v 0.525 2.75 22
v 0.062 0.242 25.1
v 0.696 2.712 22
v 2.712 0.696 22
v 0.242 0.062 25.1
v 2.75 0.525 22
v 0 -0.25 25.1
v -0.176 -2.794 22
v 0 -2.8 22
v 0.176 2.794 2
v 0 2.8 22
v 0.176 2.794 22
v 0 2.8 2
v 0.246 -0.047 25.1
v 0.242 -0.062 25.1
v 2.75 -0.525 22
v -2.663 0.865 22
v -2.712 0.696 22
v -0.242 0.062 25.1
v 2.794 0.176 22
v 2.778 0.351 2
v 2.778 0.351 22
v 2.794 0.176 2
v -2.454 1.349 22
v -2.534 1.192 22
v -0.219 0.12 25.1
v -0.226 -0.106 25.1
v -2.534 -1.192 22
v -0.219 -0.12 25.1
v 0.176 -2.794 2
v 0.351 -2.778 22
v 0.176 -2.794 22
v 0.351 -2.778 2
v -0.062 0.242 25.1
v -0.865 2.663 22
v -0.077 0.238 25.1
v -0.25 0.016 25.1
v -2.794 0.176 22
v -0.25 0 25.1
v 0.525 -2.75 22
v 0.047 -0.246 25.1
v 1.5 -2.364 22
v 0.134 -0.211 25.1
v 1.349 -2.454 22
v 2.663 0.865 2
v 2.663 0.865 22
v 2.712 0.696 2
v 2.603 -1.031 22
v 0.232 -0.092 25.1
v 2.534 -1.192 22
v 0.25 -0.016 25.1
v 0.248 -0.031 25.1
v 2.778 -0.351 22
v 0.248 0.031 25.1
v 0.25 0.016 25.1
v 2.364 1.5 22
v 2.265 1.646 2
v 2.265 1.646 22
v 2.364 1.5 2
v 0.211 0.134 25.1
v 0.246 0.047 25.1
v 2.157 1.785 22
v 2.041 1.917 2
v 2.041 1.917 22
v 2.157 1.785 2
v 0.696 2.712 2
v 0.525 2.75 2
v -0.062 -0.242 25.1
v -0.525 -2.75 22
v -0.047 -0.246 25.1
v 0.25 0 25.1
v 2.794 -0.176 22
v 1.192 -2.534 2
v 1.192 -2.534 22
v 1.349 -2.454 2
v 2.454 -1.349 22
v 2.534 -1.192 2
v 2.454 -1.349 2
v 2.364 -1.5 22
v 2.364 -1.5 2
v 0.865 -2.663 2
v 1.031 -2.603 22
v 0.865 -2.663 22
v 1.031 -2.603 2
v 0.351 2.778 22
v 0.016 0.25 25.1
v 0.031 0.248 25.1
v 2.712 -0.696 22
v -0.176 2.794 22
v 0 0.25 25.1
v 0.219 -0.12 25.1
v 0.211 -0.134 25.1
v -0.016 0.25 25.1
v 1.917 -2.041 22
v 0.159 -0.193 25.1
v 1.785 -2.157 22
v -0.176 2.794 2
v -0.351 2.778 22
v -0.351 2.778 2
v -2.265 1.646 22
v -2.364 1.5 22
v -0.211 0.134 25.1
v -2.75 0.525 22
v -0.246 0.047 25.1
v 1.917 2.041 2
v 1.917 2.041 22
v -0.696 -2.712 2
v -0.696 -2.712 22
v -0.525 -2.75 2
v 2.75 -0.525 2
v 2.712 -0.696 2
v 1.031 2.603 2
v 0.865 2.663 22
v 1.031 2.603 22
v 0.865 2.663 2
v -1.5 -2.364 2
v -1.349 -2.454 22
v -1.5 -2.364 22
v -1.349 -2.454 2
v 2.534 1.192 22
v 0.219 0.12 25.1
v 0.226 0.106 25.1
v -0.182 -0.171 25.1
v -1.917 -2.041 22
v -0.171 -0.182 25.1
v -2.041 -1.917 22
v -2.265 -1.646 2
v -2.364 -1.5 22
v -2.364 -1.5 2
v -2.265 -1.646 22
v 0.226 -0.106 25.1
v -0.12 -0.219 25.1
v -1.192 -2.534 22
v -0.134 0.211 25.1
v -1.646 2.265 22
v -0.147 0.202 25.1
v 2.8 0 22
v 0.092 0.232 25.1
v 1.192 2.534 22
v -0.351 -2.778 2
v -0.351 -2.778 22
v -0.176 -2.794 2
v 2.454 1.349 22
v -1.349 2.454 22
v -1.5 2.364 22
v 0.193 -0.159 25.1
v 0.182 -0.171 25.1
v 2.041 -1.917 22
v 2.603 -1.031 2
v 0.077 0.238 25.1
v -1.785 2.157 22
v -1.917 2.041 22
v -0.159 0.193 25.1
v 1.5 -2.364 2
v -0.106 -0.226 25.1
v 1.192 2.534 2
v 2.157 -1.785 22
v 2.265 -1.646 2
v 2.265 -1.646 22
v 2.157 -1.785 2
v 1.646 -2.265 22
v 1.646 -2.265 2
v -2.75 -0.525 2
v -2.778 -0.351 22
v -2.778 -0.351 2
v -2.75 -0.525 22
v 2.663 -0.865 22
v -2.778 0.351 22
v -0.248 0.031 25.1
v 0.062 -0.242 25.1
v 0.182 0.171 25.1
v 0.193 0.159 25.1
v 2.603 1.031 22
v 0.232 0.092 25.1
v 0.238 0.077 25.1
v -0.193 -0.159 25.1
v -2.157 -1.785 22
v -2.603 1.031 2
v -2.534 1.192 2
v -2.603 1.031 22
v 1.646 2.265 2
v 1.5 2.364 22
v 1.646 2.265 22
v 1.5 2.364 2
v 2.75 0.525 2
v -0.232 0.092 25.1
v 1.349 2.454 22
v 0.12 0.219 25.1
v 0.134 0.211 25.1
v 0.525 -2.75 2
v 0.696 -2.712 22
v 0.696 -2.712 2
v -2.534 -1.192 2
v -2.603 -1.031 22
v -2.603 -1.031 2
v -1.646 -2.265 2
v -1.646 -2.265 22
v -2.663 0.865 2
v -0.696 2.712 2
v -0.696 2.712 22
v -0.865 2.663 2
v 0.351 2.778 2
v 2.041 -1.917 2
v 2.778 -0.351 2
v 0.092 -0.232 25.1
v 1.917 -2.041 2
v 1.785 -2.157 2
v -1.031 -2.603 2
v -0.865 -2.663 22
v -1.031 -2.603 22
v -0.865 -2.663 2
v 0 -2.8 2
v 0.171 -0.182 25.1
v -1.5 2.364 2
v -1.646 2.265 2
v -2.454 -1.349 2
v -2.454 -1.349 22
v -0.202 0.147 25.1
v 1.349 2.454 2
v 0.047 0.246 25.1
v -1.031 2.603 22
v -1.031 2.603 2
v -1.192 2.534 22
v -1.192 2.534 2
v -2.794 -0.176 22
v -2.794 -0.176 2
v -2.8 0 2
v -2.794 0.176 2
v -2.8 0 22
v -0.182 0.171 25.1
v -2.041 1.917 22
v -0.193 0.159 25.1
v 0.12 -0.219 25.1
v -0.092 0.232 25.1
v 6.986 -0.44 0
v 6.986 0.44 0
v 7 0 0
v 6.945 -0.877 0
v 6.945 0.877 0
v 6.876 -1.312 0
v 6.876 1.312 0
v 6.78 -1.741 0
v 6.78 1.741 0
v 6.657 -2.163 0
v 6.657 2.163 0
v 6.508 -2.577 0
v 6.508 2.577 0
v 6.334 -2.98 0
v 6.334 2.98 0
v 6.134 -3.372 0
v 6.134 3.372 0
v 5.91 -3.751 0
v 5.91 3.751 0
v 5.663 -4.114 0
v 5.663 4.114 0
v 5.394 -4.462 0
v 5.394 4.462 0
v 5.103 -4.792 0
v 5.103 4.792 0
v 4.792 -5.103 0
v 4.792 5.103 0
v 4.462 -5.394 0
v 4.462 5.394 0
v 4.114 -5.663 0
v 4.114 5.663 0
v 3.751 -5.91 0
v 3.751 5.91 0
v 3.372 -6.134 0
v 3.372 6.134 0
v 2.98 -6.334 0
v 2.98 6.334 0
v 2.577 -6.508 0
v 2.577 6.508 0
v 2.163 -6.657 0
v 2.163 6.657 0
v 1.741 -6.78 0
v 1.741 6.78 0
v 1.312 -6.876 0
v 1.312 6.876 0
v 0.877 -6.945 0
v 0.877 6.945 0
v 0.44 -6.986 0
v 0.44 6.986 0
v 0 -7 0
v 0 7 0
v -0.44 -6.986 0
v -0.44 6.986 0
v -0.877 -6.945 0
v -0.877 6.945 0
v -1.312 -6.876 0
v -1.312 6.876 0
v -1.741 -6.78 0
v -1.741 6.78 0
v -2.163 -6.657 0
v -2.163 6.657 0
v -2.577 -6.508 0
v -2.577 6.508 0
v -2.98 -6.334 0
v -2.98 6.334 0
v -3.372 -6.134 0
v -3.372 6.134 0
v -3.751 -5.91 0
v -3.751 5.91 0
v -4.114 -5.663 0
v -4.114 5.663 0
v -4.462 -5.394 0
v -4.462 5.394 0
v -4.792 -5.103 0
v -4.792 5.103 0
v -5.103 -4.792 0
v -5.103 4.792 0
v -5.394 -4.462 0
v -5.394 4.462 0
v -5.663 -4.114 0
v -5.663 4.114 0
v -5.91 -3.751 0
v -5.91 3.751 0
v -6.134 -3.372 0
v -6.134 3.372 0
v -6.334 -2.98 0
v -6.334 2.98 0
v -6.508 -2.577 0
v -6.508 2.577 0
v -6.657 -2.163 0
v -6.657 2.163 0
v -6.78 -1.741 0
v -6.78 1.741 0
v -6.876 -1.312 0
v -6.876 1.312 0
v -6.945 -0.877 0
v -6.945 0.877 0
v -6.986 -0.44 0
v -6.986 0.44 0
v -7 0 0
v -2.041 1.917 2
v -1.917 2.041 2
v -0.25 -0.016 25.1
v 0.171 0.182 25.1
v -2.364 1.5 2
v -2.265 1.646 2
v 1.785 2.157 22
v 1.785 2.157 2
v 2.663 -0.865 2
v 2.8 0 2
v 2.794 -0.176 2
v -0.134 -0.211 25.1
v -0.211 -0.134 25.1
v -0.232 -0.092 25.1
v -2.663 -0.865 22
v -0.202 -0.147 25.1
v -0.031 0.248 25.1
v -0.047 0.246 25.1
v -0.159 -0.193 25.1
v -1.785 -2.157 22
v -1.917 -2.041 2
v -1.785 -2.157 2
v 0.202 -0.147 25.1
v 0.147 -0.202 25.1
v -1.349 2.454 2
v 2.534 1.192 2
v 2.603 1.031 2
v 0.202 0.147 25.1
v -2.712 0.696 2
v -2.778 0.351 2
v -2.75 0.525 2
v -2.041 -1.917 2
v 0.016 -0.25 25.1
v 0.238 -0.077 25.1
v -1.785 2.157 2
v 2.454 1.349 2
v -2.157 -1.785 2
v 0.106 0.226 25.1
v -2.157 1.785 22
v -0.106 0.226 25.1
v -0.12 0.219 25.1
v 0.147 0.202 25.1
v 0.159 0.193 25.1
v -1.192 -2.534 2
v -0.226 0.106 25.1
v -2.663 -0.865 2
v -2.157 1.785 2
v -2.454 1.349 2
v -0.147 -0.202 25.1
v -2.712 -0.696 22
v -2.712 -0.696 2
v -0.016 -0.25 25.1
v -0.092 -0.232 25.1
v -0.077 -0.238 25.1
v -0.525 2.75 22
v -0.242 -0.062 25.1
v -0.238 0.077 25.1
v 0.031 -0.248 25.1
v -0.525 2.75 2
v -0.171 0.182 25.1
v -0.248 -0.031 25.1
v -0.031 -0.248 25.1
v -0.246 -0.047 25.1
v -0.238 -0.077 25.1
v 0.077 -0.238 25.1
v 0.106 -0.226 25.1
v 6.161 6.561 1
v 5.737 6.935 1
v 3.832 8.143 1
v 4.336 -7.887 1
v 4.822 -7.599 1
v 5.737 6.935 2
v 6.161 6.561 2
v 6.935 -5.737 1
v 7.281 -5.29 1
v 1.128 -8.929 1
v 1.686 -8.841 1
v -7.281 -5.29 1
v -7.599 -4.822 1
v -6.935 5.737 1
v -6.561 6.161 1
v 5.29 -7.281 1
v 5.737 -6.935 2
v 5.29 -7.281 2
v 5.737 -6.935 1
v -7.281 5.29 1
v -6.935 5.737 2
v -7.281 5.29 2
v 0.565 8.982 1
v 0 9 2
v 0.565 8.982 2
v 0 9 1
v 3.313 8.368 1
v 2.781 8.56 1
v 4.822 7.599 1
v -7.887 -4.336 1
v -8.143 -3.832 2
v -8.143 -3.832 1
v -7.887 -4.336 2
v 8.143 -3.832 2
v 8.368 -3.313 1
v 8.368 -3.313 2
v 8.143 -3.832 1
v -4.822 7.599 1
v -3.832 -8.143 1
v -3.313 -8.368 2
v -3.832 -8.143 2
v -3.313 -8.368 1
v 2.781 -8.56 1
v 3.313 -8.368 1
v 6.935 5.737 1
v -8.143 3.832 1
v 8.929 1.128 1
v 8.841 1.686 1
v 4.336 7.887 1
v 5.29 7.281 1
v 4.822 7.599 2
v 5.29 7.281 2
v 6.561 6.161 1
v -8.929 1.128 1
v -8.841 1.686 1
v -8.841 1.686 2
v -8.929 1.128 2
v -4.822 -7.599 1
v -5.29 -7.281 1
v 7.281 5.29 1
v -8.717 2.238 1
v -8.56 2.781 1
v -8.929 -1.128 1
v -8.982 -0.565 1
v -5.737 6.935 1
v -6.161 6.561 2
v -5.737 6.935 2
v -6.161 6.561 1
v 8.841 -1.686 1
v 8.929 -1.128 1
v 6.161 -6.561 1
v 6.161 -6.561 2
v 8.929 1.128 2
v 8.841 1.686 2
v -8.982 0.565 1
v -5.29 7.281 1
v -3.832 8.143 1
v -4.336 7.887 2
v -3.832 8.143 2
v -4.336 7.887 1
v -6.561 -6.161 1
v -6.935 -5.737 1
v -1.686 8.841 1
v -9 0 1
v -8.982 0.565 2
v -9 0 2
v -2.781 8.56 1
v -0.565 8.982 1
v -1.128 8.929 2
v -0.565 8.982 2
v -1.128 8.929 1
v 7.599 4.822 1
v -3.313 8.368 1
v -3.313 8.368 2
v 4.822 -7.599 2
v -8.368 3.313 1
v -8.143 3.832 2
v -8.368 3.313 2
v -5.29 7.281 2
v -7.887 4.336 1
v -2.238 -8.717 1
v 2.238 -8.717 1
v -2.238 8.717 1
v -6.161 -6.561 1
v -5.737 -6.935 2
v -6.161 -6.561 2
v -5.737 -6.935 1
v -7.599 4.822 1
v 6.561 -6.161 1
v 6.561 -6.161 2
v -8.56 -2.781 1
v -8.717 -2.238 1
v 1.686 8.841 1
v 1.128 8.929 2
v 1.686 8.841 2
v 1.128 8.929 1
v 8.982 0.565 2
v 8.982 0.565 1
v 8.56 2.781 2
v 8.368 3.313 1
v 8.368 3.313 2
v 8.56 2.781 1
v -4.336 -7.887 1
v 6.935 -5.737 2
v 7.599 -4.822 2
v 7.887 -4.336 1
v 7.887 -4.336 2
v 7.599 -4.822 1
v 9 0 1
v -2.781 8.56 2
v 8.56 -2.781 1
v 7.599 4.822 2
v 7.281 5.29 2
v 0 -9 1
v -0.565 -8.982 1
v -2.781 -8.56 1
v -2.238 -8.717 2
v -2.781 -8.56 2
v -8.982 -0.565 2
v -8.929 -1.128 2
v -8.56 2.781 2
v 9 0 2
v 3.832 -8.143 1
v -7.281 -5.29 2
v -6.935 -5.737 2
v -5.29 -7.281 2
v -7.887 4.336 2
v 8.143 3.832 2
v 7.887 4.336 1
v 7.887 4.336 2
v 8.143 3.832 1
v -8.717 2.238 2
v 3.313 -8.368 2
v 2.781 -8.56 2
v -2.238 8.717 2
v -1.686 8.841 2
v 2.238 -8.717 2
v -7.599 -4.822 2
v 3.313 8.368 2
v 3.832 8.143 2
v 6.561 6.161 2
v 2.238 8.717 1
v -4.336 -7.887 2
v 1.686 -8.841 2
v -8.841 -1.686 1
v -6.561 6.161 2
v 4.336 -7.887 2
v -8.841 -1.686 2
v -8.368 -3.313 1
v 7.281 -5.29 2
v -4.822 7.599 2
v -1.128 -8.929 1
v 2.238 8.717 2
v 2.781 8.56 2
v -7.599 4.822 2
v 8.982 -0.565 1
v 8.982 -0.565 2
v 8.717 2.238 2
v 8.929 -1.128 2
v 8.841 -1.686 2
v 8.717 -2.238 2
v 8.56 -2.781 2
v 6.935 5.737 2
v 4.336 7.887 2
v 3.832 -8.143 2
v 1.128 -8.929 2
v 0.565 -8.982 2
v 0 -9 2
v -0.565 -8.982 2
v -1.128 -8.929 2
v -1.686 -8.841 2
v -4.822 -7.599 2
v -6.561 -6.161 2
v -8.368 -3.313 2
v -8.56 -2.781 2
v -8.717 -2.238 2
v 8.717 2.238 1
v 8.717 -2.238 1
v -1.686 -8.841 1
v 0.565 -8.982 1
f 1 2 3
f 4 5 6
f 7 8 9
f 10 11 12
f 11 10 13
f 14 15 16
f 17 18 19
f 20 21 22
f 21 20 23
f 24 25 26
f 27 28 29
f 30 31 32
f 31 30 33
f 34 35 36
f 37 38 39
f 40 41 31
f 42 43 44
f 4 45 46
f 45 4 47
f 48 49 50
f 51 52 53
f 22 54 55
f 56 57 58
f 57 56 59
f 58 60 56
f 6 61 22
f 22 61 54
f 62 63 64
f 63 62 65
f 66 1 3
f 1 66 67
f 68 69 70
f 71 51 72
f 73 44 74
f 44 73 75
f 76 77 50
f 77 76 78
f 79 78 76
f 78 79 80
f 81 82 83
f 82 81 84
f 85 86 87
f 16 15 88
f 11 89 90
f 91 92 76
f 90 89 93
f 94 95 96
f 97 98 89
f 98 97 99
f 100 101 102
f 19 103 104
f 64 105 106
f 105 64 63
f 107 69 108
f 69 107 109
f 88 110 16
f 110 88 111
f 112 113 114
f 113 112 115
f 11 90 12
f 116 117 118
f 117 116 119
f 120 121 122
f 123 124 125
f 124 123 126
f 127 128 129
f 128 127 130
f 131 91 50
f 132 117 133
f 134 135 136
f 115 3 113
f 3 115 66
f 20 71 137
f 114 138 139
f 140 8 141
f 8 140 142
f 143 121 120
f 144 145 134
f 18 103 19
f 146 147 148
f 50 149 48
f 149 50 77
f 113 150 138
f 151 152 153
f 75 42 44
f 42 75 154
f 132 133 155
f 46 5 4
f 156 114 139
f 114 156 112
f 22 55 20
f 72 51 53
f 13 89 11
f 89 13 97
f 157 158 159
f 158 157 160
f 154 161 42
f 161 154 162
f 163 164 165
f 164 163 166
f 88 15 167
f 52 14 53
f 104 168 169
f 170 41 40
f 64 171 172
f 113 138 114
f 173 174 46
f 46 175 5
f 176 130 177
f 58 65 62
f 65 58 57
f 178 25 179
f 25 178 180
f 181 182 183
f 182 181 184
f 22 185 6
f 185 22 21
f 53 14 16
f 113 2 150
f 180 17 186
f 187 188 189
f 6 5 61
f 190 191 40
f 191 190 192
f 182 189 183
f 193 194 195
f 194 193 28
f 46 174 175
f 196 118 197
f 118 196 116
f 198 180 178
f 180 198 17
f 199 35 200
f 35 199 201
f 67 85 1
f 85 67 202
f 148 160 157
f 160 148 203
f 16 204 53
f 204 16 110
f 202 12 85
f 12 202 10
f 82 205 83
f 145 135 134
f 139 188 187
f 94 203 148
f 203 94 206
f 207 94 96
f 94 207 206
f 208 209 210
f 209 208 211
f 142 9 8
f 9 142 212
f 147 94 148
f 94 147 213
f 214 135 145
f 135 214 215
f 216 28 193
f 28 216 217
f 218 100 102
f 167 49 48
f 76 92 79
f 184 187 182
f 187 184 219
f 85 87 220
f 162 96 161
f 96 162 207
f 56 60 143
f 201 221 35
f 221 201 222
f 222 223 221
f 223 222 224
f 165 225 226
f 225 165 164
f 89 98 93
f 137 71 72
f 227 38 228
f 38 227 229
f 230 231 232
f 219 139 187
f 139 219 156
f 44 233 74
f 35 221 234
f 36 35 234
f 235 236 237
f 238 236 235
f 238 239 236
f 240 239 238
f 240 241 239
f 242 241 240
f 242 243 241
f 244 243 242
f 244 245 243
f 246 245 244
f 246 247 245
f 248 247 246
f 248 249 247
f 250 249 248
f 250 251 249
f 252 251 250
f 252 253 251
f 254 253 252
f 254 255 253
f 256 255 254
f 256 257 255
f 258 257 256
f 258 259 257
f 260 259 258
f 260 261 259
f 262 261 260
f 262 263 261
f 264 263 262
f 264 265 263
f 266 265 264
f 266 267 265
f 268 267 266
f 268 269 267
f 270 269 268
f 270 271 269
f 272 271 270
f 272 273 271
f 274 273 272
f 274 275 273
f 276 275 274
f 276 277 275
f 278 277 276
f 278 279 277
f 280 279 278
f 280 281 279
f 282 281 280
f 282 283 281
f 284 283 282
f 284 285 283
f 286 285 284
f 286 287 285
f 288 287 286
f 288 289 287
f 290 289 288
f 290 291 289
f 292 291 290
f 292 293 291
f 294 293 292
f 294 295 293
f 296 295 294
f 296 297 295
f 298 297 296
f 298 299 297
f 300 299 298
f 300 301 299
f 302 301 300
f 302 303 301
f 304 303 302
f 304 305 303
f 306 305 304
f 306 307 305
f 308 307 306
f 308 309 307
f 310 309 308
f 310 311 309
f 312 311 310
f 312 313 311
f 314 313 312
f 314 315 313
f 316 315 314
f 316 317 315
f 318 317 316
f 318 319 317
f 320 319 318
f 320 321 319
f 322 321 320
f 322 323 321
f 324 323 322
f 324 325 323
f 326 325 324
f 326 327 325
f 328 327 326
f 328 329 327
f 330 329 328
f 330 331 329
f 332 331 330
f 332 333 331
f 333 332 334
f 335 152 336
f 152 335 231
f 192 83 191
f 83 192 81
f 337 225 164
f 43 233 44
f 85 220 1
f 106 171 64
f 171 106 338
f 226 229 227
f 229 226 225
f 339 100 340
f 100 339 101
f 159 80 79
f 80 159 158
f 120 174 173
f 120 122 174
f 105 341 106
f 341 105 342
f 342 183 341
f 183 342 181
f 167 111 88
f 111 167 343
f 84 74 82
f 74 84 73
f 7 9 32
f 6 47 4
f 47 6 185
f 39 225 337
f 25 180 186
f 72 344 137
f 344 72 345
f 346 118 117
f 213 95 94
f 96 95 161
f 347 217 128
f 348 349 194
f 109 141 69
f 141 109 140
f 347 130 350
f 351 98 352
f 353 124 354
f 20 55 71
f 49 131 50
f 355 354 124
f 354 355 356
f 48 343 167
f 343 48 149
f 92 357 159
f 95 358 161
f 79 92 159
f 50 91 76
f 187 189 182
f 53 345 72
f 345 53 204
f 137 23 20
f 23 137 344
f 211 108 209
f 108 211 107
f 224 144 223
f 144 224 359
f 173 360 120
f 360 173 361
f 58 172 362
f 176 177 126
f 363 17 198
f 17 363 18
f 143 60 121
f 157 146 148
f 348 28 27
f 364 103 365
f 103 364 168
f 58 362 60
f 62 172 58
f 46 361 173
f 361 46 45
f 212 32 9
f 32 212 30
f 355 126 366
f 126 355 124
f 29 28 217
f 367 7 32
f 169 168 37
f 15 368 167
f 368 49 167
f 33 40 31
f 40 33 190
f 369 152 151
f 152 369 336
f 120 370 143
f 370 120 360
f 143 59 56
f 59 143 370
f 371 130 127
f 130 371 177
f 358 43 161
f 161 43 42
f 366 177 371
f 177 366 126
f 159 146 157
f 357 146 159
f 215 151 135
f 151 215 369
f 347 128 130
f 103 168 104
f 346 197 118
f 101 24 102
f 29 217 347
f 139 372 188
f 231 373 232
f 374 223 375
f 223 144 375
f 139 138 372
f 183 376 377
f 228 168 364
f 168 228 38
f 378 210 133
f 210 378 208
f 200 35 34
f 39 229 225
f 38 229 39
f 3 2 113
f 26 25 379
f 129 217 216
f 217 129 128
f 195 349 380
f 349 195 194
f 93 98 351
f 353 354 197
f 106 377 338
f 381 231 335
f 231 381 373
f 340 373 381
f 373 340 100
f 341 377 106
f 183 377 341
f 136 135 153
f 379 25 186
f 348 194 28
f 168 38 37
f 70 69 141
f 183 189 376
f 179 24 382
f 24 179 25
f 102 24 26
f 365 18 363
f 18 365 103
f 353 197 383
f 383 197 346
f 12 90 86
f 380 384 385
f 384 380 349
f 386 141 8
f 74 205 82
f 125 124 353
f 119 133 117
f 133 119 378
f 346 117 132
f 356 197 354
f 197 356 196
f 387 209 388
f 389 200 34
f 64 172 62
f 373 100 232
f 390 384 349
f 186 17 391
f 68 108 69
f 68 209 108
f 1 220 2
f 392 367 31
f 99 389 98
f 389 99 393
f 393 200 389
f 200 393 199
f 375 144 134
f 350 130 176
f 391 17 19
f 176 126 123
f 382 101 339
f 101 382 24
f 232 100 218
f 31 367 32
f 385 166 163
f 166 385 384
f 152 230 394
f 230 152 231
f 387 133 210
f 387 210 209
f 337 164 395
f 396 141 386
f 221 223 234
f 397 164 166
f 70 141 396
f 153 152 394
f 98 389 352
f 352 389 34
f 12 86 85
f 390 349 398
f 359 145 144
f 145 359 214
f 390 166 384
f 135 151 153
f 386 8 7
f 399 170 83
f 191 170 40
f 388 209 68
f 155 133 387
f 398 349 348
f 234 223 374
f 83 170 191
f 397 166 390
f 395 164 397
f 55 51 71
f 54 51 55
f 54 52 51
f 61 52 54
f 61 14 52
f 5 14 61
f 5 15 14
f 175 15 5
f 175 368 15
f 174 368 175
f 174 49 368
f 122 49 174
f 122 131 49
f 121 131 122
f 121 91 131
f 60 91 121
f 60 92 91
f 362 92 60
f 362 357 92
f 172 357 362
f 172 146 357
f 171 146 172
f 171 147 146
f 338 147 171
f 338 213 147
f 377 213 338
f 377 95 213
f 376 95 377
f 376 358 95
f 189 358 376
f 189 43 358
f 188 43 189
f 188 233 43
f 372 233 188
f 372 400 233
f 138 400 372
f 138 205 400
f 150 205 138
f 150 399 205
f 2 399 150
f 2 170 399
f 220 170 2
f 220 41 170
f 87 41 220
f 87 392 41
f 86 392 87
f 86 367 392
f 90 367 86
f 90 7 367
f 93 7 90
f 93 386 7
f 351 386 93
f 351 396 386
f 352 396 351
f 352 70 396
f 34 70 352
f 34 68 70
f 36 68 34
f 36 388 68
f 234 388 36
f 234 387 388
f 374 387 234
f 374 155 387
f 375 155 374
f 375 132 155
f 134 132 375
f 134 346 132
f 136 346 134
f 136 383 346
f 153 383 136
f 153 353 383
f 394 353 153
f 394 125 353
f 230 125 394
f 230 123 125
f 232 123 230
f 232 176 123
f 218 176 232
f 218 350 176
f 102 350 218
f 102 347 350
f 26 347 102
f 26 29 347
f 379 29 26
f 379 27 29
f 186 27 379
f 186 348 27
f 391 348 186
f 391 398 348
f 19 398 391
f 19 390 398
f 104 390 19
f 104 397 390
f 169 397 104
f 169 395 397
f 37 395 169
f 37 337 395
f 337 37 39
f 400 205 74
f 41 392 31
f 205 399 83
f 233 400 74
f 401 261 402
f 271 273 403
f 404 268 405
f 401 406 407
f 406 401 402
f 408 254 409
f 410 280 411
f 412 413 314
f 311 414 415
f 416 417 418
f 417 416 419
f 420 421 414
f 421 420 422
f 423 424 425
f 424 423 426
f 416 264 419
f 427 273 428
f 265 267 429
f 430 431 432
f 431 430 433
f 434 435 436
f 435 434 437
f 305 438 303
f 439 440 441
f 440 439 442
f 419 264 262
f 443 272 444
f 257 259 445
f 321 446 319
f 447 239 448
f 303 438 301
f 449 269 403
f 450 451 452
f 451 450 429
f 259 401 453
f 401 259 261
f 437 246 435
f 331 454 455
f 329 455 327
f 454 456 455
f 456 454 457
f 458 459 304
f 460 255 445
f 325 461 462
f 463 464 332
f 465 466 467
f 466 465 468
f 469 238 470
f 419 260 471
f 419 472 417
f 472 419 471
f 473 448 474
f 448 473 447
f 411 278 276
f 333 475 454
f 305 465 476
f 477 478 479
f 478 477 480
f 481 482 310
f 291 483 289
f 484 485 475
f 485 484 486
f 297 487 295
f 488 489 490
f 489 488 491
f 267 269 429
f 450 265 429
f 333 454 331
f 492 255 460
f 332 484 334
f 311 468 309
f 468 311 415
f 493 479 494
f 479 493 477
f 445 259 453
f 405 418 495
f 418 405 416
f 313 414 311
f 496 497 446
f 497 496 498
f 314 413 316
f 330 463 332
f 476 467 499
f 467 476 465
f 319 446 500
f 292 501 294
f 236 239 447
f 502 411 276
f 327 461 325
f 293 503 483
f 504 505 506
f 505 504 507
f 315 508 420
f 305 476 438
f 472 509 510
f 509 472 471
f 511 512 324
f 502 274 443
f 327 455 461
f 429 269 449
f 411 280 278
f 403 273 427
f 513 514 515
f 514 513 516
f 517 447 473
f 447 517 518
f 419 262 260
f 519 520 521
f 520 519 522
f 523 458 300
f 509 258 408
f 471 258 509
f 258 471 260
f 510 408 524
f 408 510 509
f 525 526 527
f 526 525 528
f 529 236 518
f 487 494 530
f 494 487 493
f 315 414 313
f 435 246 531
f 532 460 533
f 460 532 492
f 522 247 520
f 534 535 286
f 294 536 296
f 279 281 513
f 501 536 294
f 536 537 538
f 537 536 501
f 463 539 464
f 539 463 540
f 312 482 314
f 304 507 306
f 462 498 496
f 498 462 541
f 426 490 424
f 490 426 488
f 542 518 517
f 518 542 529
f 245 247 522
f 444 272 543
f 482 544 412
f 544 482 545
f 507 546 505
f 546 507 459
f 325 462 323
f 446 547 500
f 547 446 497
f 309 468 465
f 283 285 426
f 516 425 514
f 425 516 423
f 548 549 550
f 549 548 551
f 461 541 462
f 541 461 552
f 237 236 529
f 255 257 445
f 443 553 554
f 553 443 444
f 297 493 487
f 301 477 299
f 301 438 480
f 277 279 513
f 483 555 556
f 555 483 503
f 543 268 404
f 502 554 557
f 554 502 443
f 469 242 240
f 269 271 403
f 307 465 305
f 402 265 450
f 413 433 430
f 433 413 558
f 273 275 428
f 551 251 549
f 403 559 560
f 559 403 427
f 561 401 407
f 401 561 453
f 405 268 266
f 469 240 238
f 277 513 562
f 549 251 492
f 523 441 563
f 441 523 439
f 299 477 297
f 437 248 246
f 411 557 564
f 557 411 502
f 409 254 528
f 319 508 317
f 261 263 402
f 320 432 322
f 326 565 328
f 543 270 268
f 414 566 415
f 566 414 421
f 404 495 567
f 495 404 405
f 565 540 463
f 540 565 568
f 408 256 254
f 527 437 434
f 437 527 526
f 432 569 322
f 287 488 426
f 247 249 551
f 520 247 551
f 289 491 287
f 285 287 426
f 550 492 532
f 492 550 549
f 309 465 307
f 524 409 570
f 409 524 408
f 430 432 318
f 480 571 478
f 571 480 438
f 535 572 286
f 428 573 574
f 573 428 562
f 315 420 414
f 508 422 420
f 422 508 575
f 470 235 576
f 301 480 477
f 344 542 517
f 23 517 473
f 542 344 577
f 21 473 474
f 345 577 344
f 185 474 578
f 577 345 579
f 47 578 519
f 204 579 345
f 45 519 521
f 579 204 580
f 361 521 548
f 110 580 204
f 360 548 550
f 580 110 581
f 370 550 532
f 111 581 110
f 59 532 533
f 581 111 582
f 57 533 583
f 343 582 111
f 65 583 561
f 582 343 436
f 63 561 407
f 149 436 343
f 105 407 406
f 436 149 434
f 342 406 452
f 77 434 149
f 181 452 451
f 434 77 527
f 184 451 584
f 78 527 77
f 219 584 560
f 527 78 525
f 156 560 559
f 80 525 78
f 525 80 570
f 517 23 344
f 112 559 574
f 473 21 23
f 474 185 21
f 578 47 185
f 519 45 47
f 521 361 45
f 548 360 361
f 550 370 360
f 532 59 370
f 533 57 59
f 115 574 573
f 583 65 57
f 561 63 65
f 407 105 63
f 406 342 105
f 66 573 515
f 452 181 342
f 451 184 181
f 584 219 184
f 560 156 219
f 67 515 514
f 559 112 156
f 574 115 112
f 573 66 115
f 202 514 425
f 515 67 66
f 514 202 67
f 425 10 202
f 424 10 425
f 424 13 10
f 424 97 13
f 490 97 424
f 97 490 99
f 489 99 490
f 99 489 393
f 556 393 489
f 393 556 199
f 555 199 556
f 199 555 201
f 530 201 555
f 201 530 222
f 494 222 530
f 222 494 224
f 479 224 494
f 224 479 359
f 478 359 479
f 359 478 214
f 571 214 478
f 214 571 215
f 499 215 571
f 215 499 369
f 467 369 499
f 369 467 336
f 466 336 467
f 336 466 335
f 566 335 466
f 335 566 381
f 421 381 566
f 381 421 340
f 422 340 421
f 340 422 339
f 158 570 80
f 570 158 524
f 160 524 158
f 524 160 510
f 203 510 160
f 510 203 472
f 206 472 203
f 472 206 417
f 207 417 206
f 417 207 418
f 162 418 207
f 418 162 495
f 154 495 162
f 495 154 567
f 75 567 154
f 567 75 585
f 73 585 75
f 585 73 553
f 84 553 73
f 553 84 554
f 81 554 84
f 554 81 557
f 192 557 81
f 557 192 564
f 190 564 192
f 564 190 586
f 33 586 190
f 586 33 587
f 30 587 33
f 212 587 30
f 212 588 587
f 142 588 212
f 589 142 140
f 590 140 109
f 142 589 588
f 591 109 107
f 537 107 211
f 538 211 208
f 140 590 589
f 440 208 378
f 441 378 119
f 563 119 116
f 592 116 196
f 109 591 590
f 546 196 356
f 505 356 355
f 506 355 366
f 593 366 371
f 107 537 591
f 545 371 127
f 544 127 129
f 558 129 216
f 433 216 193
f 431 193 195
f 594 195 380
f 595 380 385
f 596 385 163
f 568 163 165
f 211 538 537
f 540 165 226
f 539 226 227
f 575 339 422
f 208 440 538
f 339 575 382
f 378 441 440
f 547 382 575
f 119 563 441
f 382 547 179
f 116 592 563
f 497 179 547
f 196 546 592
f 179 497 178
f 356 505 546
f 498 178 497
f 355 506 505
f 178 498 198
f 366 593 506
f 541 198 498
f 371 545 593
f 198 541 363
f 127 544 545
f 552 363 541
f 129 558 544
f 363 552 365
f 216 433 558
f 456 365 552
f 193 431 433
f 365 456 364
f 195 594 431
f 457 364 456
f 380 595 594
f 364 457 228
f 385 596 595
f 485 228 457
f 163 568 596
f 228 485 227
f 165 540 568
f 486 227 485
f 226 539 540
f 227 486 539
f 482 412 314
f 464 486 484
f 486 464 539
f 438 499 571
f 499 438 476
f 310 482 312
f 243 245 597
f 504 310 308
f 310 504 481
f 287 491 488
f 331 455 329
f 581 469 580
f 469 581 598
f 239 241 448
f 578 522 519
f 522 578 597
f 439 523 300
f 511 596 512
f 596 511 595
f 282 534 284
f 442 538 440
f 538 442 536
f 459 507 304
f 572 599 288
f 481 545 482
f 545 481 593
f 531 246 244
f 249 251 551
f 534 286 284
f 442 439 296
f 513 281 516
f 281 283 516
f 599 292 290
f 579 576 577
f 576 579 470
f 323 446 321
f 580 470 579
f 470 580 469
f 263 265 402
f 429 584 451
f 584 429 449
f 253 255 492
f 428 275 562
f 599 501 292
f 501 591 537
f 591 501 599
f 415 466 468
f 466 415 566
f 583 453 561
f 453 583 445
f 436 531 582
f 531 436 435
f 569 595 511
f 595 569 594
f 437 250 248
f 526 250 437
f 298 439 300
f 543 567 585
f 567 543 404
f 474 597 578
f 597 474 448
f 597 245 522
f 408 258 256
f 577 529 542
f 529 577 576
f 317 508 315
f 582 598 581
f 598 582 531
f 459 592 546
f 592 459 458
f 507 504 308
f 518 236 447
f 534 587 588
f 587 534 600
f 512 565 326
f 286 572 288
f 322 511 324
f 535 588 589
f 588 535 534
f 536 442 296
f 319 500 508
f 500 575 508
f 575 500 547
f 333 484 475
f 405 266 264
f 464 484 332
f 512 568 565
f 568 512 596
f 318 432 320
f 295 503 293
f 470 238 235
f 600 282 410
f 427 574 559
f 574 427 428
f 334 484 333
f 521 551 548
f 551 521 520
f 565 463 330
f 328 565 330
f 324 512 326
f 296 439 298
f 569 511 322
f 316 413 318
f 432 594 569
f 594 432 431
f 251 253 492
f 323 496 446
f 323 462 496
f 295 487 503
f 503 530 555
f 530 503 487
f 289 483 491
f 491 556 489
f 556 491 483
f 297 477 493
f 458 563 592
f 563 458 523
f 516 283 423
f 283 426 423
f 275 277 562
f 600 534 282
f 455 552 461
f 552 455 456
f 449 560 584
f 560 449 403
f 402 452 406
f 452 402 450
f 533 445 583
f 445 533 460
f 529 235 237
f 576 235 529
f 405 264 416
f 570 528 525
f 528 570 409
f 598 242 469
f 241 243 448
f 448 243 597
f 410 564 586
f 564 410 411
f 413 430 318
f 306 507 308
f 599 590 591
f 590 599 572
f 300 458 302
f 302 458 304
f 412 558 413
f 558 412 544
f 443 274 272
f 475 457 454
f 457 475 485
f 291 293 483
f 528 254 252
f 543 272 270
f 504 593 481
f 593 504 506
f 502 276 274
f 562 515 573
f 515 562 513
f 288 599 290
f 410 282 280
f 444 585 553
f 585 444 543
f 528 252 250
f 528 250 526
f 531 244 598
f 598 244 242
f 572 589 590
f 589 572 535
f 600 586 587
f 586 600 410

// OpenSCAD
$fn=100;

hull()
{
	cylinder(h=22, d=5.6);
	translate([0,0,25]) cylinder(h=0.1, d=0.5);
}
hull()
{
	cylinder(h=0.01, d=14);
	translate([0,0,1]) cylinder(h=1, d=18);
}
